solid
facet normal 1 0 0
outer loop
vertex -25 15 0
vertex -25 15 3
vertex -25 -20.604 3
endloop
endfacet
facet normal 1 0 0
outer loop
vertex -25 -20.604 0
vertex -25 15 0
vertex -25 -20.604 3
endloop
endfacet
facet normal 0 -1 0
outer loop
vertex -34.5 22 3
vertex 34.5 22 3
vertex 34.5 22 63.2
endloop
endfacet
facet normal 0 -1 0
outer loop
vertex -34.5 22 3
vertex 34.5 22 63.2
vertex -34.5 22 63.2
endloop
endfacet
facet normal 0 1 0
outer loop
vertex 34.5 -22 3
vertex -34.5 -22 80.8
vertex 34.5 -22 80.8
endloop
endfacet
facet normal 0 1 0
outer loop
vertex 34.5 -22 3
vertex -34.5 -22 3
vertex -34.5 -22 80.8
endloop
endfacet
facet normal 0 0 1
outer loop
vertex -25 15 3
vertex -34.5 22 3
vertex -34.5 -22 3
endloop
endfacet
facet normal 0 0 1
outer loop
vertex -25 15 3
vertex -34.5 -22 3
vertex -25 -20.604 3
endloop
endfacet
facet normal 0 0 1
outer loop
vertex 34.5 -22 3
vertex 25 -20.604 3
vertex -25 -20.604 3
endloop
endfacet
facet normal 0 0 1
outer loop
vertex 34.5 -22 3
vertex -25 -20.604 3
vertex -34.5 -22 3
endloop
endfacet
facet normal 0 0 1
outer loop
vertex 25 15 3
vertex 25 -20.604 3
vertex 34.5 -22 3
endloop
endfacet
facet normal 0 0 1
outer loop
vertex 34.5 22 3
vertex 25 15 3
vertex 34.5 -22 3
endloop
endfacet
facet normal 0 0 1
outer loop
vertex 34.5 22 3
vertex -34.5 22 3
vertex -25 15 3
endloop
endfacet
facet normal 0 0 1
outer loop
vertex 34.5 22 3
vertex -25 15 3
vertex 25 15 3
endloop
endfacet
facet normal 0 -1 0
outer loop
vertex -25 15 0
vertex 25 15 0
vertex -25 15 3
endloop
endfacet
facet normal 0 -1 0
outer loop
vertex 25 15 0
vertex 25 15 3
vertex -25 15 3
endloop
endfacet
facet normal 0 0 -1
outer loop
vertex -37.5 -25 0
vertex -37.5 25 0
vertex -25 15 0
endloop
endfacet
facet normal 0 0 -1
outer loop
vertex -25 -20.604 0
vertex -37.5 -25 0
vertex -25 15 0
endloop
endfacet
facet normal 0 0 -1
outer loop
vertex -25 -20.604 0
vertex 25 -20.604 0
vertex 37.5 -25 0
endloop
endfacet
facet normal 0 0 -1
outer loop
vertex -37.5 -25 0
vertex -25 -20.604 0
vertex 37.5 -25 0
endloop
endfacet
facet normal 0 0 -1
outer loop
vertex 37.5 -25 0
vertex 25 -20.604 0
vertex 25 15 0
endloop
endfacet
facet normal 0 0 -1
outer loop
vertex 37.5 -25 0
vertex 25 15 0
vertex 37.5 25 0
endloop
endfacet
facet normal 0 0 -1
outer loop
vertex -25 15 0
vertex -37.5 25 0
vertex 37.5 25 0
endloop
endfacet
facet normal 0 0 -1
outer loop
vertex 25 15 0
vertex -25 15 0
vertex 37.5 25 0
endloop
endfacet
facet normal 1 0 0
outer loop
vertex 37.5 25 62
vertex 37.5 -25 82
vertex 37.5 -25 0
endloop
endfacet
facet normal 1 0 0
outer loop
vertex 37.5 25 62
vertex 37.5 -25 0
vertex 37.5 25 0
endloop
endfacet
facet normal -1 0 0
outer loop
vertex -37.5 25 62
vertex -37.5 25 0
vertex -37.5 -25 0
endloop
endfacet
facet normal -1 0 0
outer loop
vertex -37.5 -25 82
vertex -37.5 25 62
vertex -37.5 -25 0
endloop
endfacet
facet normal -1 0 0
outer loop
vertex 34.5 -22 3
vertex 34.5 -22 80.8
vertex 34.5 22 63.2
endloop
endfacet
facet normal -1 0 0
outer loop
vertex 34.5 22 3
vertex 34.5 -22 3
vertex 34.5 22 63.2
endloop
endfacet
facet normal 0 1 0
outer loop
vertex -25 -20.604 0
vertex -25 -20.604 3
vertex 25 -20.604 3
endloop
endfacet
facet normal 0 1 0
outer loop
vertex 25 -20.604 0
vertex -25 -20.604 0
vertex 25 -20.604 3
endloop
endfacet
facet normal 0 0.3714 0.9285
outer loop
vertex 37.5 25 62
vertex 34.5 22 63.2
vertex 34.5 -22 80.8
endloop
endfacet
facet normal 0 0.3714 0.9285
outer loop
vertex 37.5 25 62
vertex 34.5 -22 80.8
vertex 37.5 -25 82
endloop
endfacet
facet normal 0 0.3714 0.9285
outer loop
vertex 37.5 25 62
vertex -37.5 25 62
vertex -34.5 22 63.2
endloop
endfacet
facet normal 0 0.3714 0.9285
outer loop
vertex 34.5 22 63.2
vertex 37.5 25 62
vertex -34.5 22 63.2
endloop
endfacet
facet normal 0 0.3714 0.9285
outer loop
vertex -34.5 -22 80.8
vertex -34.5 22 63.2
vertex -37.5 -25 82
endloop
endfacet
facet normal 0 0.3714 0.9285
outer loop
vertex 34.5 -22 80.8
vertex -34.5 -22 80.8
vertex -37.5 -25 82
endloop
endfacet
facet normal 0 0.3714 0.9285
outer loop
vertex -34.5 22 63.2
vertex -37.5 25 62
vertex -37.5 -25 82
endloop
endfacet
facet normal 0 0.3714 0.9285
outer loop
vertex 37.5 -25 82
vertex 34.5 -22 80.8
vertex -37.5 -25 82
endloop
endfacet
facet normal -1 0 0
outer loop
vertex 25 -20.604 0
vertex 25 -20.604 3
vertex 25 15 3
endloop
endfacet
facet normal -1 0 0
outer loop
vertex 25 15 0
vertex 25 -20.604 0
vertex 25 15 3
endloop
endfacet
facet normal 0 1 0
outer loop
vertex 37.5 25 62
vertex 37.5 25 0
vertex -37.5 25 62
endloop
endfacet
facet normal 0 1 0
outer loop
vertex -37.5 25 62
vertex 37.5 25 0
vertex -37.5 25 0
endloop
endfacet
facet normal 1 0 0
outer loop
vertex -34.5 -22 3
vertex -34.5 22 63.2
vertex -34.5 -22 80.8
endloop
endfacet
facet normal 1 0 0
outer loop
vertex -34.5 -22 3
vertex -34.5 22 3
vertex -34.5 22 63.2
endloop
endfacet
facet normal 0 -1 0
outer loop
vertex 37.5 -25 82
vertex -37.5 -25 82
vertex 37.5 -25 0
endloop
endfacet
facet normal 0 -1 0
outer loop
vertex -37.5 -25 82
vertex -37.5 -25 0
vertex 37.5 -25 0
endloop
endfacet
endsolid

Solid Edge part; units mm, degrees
sketch "Sketch1" plane through (0, 0, 0) normal (0, 0, 1) x (1, 0, 0)
  line L0 (37.5, -25) -> (37.5, 25)
  line L1 (37.5, 25) -> (-37.5, 25)
  line L2 (-37.5, 25) -> (-37.5, -25)
  line L3 (-37.5, -25) -> (37.5, -25)
extrude "Protrusion1" add sketch "Sketch1" along normal blind 82
shell "Thinwall1" thickness 3 removed faces 1 at (-25.75, -16.1667, 82)
sketch "Sketch2" plane through (-37.5, 0, 30) normal (-1, 0, 0) x (0, -1, 0)
  line L0 (-25, 52) -> (-25, 32)
  line L1 (-25, 32) -> (25, 52)
  line L2 (25, 52) -> (-25, 52)
extrude "Cutout1" cut sketch "Sketch2" against normal blind 230
sketch "Sketch3" plane through (0, 0, 3) normal (0, 0, 1) x (1, 0, 0)
  line L0 (25, -15) -> (25, 15)
  line L1 (25, 15) -> (-25, 15)
  line L2 (-25, 15) -> (-25, -15)
  line L3 (-25, -15) -> (-25, -20.6045)
  line L4 (-25, -20.6045) -> (25, -20.6045)
  line L5 (25, -20.6045) -> (25, -15)
extrude "Cutout2" cut sketch "Sketch3" against normal blind 380
